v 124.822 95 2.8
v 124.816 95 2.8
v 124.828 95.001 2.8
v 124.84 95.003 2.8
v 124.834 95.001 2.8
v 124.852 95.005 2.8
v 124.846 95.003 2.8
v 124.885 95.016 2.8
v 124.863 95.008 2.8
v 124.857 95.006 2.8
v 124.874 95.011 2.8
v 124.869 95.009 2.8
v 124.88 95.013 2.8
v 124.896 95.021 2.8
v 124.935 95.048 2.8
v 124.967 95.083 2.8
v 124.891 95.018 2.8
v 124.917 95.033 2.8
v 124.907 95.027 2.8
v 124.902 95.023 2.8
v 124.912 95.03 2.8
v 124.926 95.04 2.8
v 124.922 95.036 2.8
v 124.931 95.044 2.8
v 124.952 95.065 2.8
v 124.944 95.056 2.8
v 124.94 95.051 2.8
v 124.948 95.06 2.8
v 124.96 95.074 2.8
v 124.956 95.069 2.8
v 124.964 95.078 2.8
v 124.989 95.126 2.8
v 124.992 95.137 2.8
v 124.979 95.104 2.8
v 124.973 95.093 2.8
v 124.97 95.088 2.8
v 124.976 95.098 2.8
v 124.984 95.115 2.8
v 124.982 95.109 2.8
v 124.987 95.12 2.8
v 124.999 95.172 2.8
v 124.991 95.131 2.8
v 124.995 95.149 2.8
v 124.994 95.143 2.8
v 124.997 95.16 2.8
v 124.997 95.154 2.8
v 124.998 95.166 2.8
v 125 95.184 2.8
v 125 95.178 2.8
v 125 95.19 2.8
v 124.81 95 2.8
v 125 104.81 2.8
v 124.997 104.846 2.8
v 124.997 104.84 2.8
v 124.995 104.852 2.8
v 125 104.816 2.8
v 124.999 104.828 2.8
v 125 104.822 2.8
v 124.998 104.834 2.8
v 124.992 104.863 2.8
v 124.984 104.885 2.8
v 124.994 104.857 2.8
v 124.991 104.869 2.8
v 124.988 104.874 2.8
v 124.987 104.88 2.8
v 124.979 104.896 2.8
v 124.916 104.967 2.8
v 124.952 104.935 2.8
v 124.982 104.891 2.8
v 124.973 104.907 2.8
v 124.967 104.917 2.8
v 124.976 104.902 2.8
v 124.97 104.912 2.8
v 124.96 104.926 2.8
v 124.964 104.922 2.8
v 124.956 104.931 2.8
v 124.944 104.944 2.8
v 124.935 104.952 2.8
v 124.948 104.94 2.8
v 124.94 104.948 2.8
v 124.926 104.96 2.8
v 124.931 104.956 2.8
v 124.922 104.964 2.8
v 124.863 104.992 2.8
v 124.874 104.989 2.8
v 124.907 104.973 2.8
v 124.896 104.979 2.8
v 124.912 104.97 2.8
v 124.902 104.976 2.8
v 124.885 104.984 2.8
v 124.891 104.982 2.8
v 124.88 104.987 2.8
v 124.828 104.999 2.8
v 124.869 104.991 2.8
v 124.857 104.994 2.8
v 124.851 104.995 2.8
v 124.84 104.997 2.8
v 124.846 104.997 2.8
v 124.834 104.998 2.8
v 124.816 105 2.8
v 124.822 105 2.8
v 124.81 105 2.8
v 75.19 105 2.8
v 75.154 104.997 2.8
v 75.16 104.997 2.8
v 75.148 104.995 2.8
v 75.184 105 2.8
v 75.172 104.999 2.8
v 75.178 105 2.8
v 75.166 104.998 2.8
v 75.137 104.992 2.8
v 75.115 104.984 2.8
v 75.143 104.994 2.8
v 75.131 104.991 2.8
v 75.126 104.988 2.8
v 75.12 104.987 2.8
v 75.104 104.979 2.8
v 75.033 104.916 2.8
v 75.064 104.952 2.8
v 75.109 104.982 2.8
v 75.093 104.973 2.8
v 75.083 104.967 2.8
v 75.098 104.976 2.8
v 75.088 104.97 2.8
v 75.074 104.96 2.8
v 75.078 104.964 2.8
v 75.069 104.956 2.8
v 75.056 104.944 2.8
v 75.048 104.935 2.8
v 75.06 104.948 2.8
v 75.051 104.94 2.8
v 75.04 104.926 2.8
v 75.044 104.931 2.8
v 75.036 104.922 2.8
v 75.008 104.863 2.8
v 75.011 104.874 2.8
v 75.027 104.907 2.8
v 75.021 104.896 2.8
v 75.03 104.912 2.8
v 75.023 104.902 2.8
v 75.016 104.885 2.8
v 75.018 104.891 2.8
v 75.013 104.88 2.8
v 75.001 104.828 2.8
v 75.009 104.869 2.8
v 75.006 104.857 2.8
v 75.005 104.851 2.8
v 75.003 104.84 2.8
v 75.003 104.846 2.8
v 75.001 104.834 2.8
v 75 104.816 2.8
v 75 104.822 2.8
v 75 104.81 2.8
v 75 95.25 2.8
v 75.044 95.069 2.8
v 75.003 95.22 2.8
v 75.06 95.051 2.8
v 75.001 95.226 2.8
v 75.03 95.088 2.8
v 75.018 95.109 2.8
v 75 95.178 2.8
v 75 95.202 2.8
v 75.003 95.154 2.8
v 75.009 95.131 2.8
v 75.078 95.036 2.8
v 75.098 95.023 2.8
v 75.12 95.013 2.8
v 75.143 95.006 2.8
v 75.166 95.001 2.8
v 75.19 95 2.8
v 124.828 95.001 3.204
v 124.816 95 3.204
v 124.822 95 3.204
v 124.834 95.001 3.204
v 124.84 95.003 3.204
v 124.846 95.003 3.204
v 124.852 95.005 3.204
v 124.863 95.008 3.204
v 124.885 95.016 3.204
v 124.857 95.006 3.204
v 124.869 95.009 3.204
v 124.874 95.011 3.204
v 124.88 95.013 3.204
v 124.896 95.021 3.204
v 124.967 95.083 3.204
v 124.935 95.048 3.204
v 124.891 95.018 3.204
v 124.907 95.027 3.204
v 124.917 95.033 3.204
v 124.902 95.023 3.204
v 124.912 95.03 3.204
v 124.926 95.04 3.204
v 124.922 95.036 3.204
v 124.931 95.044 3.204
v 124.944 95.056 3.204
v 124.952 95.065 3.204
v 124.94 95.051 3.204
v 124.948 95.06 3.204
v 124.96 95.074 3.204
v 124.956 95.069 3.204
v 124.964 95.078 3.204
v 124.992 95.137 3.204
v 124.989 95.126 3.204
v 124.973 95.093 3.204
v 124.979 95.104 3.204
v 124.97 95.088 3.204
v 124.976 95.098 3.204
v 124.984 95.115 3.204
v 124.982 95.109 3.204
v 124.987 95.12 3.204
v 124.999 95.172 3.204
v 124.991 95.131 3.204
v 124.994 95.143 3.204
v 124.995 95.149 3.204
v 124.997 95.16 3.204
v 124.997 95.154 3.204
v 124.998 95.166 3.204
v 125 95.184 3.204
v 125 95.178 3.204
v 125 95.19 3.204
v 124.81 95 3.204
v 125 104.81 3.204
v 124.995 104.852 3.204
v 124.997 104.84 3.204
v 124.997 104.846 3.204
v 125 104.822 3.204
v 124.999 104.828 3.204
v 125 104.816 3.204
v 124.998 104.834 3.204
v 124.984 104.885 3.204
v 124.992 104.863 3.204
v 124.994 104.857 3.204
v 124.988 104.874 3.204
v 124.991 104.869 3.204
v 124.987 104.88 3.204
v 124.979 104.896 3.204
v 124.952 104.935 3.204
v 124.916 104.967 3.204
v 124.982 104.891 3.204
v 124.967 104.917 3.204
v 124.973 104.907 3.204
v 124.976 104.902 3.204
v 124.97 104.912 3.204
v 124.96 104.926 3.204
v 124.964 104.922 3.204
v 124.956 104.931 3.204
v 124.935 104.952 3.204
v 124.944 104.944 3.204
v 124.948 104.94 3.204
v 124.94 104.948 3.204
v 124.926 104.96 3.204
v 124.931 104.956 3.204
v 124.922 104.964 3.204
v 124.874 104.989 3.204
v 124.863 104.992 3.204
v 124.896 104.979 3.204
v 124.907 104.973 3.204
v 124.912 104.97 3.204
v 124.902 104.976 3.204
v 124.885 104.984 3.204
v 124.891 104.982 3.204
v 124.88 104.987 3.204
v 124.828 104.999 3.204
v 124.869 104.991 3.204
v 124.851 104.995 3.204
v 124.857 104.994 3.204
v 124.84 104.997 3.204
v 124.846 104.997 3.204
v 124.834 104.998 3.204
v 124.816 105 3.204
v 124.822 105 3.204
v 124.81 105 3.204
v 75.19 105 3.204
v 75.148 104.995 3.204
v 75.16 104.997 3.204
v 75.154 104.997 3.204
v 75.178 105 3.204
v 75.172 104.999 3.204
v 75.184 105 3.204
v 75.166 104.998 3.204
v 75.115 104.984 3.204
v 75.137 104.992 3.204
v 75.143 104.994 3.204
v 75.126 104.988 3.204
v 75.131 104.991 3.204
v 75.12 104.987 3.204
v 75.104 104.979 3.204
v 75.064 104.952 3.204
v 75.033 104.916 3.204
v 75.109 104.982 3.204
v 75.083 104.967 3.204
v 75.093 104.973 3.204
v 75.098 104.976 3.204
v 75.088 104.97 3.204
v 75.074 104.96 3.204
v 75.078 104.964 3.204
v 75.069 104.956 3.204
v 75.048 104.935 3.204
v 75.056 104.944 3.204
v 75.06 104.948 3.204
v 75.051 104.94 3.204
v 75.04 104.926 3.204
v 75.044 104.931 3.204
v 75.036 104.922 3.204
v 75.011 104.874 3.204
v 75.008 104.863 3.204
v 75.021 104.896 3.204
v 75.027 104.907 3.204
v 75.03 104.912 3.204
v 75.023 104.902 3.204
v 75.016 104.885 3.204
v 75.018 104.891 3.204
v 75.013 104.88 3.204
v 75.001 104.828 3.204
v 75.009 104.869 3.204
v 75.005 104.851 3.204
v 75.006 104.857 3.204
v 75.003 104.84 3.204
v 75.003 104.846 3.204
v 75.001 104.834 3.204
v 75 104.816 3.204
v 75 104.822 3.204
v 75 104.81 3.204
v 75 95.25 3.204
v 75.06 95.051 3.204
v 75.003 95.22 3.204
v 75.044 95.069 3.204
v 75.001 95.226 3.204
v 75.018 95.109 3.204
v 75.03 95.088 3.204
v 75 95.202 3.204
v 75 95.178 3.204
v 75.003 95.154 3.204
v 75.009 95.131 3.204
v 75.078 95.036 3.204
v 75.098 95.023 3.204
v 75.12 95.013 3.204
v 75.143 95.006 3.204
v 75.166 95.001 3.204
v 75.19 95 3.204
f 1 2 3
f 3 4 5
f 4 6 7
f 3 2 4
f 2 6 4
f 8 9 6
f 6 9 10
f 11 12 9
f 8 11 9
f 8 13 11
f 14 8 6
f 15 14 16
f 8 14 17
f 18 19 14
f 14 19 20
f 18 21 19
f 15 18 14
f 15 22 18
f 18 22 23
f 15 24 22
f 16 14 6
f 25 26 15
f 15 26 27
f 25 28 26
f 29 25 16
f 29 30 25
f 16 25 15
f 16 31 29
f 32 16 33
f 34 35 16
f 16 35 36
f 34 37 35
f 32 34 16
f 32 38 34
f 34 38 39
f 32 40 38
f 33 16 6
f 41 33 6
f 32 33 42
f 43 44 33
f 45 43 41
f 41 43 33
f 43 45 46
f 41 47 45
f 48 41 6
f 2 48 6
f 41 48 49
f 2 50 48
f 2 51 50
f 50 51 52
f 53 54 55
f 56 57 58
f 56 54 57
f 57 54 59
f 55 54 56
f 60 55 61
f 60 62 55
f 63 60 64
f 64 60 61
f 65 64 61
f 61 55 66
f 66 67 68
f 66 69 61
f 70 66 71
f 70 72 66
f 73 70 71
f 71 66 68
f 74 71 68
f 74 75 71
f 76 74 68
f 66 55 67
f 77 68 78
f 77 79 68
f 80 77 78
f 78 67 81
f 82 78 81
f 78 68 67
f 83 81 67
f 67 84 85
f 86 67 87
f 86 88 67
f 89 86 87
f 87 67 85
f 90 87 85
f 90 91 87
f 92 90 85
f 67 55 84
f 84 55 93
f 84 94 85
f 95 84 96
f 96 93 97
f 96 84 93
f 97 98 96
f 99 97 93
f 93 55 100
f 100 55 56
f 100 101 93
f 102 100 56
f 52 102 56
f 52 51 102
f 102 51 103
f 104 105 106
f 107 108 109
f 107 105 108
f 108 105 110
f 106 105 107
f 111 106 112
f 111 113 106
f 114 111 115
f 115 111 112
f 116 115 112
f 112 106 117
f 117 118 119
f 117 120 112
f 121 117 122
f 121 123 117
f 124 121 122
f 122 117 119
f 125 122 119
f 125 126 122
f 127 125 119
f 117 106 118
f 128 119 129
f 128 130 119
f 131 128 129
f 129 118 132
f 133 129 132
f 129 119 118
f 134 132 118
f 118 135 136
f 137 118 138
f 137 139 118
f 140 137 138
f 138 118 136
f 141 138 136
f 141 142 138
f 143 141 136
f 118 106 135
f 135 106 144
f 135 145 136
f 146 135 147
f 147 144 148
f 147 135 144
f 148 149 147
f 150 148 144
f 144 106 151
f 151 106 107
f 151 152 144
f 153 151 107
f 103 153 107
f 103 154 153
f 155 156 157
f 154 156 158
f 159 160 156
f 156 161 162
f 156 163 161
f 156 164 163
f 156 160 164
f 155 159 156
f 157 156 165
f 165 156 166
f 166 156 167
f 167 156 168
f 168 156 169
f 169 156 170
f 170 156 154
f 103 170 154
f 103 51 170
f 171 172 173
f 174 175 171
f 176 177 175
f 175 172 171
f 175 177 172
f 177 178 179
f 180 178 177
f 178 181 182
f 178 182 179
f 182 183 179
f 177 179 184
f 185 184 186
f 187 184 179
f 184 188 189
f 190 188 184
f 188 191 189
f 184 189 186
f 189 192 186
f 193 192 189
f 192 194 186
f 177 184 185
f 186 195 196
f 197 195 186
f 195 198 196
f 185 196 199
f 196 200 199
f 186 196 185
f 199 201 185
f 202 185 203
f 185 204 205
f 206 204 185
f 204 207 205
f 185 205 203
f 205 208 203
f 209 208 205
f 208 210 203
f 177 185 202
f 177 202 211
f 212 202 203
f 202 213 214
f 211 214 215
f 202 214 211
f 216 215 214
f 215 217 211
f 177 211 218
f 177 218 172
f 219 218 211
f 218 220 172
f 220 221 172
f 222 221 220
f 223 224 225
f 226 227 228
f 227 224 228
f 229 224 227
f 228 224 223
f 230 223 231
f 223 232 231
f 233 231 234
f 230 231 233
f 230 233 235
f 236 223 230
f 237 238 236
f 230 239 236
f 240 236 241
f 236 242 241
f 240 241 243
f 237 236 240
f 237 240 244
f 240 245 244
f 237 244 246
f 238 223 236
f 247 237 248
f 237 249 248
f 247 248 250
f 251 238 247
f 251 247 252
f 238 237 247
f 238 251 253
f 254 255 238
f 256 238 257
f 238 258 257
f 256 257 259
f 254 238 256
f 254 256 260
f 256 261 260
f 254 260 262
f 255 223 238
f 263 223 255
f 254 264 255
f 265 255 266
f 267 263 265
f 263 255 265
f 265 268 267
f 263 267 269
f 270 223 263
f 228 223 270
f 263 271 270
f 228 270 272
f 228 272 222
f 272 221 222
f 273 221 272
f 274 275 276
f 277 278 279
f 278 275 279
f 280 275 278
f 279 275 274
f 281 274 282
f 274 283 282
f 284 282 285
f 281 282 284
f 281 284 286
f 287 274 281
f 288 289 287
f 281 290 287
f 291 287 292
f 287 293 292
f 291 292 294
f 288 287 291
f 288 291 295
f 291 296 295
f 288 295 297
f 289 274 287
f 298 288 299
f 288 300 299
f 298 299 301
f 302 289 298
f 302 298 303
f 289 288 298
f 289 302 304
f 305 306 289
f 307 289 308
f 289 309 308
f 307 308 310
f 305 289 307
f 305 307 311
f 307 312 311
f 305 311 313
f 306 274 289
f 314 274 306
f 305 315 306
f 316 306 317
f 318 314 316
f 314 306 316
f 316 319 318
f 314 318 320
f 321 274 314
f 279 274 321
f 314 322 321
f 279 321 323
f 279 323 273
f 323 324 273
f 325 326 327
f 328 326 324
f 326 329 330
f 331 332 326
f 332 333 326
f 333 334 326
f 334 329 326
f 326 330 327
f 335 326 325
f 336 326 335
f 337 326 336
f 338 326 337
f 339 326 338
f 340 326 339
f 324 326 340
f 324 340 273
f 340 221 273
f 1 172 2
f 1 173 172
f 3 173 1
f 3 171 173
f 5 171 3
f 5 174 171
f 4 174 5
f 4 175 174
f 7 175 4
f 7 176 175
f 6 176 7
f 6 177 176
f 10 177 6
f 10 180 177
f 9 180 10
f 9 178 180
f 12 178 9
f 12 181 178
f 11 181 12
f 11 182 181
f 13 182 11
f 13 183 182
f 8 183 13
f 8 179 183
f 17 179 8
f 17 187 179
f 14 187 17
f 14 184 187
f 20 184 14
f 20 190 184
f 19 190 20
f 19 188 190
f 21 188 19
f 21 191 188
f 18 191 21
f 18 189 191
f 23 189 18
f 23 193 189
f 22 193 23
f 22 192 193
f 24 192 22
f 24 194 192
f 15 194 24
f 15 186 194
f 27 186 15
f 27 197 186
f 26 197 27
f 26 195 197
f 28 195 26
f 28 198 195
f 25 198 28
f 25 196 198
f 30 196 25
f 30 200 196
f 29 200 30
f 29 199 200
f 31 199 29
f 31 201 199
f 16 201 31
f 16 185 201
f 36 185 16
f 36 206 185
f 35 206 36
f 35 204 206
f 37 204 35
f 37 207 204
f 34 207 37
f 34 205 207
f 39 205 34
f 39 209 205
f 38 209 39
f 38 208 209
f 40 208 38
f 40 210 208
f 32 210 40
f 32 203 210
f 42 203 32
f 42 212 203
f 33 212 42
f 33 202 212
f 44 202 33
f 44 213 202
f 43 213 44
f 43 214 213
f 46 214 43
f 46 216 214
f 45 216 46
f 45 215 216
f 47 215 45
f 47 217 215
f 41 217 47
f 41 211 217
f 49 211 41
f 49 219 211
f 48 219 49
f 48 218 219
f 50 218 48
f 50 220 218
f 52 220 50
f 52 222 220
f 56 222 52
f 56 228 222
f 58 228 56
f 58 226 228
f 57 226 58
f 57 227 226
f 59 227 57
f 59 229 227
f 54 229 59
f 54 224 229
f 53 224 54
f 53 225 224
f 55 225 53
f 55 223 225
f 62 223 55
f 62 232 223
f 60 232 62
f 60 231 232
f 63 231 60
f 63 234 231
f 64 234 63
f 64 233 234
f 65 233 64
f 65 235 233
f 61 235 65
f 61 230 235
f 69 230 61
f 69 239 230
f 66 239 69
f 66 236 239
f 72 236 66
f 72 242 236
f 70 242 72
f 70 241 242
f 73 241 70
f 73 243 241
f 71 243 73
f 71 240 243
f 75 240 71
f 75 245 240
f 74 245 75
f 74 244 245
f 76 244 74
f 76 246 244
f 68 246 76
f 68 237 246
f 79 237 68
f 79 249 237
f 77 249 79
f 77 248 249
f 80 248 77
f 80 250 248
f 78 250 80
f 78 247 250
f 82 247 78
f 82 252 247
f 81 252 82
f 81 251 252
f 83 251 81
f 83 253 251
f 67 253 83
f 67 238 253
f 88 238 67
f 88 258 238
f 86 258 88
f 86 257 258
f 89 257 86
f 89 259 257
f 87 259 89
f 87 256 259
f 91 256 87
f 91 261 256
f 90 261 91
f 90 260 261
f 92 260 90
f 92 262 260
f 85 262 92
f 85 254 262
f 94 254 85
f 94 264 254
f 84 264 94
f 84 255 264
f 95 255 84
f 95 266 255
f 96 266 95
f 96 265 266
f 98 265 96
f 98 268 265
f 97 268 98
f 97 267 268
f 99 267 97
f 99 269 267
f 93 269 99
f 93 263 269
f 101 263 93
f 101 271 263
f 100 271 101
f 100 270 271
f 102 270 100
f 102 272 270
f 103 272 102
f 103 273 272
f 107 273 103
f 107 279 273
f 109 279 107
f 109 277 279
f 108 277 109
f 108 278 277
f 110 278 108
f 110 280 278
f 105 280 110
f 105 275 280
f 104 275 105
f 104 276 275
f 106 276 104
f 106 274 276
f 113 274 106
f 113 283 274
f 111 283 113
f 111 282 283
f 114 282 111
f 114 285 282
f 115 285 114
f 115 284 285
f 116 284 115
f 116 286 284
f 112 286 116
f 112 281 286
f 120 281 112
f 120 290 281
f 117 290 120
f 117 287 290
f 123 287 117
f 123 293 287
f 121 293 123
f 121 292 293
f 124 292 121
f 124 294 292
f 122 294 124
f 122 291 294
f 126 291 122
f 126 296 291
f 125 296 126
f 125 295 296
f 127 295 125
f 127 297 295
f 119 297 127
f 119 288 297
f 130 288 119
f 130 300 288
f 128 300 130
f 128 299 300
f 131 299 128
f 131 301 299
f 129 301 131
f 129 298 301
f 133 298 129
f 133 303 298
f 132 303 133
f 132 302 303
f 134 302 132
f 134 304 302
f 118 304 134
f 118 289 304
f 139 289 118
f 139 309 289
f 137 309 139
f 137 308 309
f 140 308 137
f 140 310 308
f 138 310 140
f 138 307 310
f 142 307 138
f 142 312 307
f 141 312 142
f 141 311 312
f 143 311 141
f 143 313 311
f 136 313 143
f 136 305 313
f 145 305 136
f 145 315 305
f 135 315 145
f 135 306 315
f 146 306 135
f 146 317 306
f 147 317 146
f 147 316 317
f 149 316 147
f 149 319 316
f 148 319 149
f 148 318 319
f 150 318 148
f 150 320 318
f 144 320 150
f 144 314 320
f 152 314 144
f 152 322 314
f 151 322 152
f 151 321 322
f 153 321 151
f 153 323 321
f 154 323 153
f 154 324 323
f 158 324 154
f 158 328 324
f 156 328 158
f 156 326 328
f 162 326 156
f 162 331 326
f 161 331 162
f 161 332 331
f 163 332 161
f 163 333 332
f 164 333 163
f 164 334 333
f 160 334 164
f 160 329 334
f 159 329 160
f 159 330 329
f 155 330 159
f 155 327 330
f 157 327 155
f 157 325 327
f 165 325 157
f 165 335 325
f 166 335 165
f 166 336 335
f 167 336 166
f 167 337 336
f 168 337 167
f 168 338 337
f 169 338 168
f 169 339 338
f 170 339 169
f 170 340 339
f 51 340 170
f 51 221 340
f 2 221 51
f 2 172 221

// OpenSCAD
module drawBasicShape(x1, y1, x2, y2, width)
{
	length = sqrt((x1-x2)*(x1-x2) + (y1-y2)*(y1-y2));
	if (width!=0.0) {
		square(size = [width, length], center = false);
		translate([width/2.0, 0, 0]) circle(d=width);
		translate([width/2.0, length, 0]) circle(d=width);
	}
}

module translateAndRotate(x1, y1, x2, y2, width)
{
	if (width != 0.0) {
		angle = atan((y2-y1)/(x2-x1)) +270;
		if (x2>=x1) {
			translate([x1, y1, 0.0]) rotate([0.0, 0.0, angle]) translate([-width/2.0, 0.0, 0.0]) scale([1.0, 1.0, 1.0]) drawBasicShape(x1, y1, x2, y2, width);
		}
		else {
			translate([x1, y1, 0.0]) rotate([0.0, 0.0, angle+180]) translate([-width/2.0, 0.0, 0.0]) scale([1.0, 1.0, 1.0]) drawBasicShape(x1, y1, x2, y2, width);		}
	}
}

$fn=50;

points6 = [
[75.77800000, 95.77800000, 0.00000000],
[124.22200000, 95.77800000, 0.37999548],
[124.22200000, 104.22200000, 0.37997788],
[75.77800000, 104.22200000, 0.37999672],
[75.77800000, 95.83800000, 0.37997423],
[75.48400000, 95.48400000, 0.00000000],
[124.51600000, 95.48400000, 0.37999868],
[124.51600000, 104.51600000, 0.37998977],
[75.48400000, 104.51600000, 0.37999746],
[75.48400000, 95.54400000, 0.37999314],
[75.19000000, 95.19000000, 0.00000000],
[124.81000000, 95.19000000, 0.37999939],
[124.81000000, 104.81000000, 0.38000021],
[75.19000000, 104.81000000, 0.38000060],
[75.19000000, 95.25000000, 0.37999715],
[75.53600000, 95.39000000, 0.00000000],
[75.94600000, 103.88900000, 0.00000000],
[76.11100000, 104.05400000, 0.37961375],
[76.52800000, 104.05400000, 0.38001190],
[75.94600000, 103.47200000, 0.37989934],
[75.94600000, 103.05500000, 0.38015610],
[76.94500000, 104.05400000, 0.37994651],
[77.36200000, 104.05400000, 0.38001190],
[75.94600000, 102.63800000, 0.37999592],
[75.94600000, 102.22100000, 0.38001190],
[77.77900000, 104.05400000, 0.37999966],
[78.19600000, 104.05400000, 0.38015610],
[75.94600000, 101.80400000, 0.38000201],
[75.94600000, 101.38700000, 0.38001190],
[78.61300000, 104.05400000, 0.38001957],
[79.03000000, 104.05400000, 0.38001190],
[75.94600000, 100.97000000, 0.38001859],
[75.94600000, 100.55300000, 0.38015610],
[79.44700000, 104.05400000, 0.38001785],
[79.86400000, 104.05400000, 0.38001190],
[75.94600000, 100.13600000, 0.38002811],
[75.94600000, 99.71900000, 0.38001190],
[80.28100000, 104.05400000, 0.38002660],
[80.69800000, 104.05400000, 0.38001190],
[75.94600000, 99.30200000, 0.38003429],
[75.94600000, 98.88500000, 0.38001190],
[81.11500000, 104.05400000, 0.38003252],
[81.53300000, 104.05400000, 0.37930814],
[75.94600000, 98.46700000, 0.37997836],
[75.94600000, 98.05000000, 0.38001190],
[81.95000000, 104.05400000, 0.37998780],
[82.36700000, 104.05400000, 0.38001190],
[75.94600000, 97.63300000, 0.37998277],
[75.94600000, 97.21600000, 0.38015610],
[82.78400000, 104.05400000, 0.37999079],
[83.20100000, 104.05400000, 0.38001190],
[75.94600000, 96.79900000, 0.37999203],
[75.94600000, 96.38200000, 0.38015610],
[83.61800000, 104.05400000, 0.37999314],
[84.03500000, 104.05400000, 0.38001190],
[75.95600000, 95.97600000, 0.38000275],
[76.34400000, 95.94600000, 0.37958004],
[84.45200000, 104.05400000, 0.38000754],
[84.86900000, 104.05400000, 0.38001190],
[76.76100000, 95.94600000, 0.38000229],
[77.17800000, 95.94600000, 0.38015610],
[85.28600000, 104.05400000, 0.38000229],
[85.70300000, 104.05400000, 0.38001190],
[77.59500000, 95.94600000, 0.38000229],
[78.01200000, 95.94600000, 0.38015610],
[86.12000000, 104.05400000, 0.38000229],
[86.53700000, 104.05400000, 0.38001190],
[78.42900000, 95.94600000, 0.38000754],
[78.84600000, 95.94600000, 0.38001190],
[86.95400000, 104.05400000, 0.38000229],
[87.37100000, 104.05400000, 0.38015610],
[79.26300000, 95.94600000, 0.38000229],
[79.68000000, 95.94600000, 0.38001190],
[87.78900000, 104.05400000, 0.37998415],
[88.20600000, 104.05400000, 0.38015610],
[80.09700000, 95.94600000, 0.37998415],
[80.51500000, 95.94600000, 0.37930814],
[88.62300000, 104.05400000, 0.38000754],
[89.04000000, 104.05400000, 0.38001190],
[80.93200000, 95.94600000, 0.38000229],
[81.34900000, 95.94600000, 0.38015610],
[89.45700000, 104.05400000, 0.38000229],
[89.87400000, 104.05400000, 0.38001190],
[81.76600000, 95.94600000, 0.38000229],
[82.18300000, 95.94600000, 0.38015610],
[90.29100000, 104.05400000, 0.38000229],
[90.70800000, 104.05400000, 0.38001190],
[82.60000000, 95.94600000, 0.38000754],
[83.01700000, 95.94600000, 0.38001190],
[91.12500000, 104.05400000, 0.38000229],
[91.54200000, 104.05400000, 0.38001190],
[83.43400000, 95.94600000, 0.38000754],
[83.85100000, 95.94600000, 0.38001190],
[91.95900000, 104.05400000, 0.38000229],
[92.37600000, 104.05400000, 0.38015610],
[84.26800000, 95.94600000, 0.38000229],
[84.68500000, 95.94600000, 0.38001190],
[92.79300000, 104.05400000, 0.38000754],
[93.21000000, 104.05400000, 0.38001190],
[85.10200000, 95.94600000, 0.38000229],
[85.51900000, 95.94600000, 0.38001190],
[93.62700000, 104.05400000, 0.38000754],
[94.04400000, 104.05400000, 0.38001190],
[85.93600000, 95.94600000, 0.38000229],
[86.35300000, 95.94600000, 0.38015610],
[94.46200000, 104.05400000, 0.37998415],
[94.87900000, 104.05400000, 0.38001190],
[86.77000000, 95.94600000, 0.37998940],
[87.18800000, 95.94600000, 0.37930814],
[95.29600000, 104.05400000, 0.38000229],
[95.71300000, 104.05400000, 0.38001190],
[87.60500000, 95.94600000, 0.38000754],
[88.02200000, 95.94600000, 0.38001190],
[96.13000000, 104.05400000, 0.38000229],
[96.54700000, 104.05400000, 0.38015610],
[88.43900000, 95.94600000, 0.38000229],
[88.85600000, 95.94600000, 0.38001190],
[96.96400000, 104.05400000, 0.38000754],
[97.38100000, 104.05400000, 0.38001190],
[89.27300000, 95.94600000, 0.38000229],
[89.69000000, 95.94600000, 0.38001190],
[97.79800000, 104.05400000, 0.38000754],
[98.21500000, 104.05400000, 0.38001190],
[90.10700000, 95.94600000, 0.38000229],
[90.52400000, 95.94600000, 0.38015610],
[98.63200000, 104.05400000, 0.38000229],
[99.04900000, 104.05400000, 0.38001190],
[90.94100000, 95.94600000, 0.38000754],
[91.35800000, 95.94600000, 0.38001190],
[99.46600000, 104.05400000, 0.38000229],
[99.88300000, 104.05400000, 0.38001190],
[91.77500000, 95.94600000, 0.38000754],
[92.19200000, 95.94600000, 0.38001190],
[100.30000000, 104.05400000, 0.38000229],
[100.71800000, 104.05400000, 0.37945200],
[92.60900000, 95.94600000, 0.37998415],
[93.02600000, 95.94600000, 0.38001190],
[101.13500000, 104.05400000, 0.37998940],
[101.55200000, 104.05400000, 0.38001190],
[93.44400000, 95.94600000, 0.38000229],
[93.86100000, 95.94600000, 0.38001190],
[101.96900000, 104.05400000, 0.38000754],
[102.38600000, 104.05400000, 0.38001190],
[94.27800000, 95.94600000, 0.38000229],
[94.69500000, 95.94600000, 0.38015610],
[102.80300000, 104.05400000, 0.38000229],
[103.22000000, 104.05400000, 0.38001190],
[95.11200000, 95.94600000, 0.38000229],
[95.52900000, 95.94600000, 0.38015610],
[103.63700000, 104.05400000, 0.38000229],
[104.05400000, 104.05400000, 0.38001190],
[95.94600000, 95.94600000, 0.38000754],
[96.36300000, 95.94600000, 0.38001190],
[104.47100000, 104.05400000, 0.38000229],
[104.88800000, 104.05400000, 0.38001190],
[96.78000000, 95.94600000, 0.38000754],
[97.19700000, 95.94600000, 0.38001190],
[105.30500000, 104.05400000, 0.38000229],
[105.72200000, 104.05400000, 0.38015610],
[97.61400000, 95.94600000, 0.38000229],
[98.03100000, 95.94600000, 0.38001190],
[106.13900000, 104.05400000, 0.38000754],
[106.55600000, 104.05400000, 0.38001190],
[98.44800000, 95.94600000, 0.38000229],
[98.86500000, 95.94600000, 0.38001190],
[106.97300000, 104.05400000, 0.38000754],
[107.39100000, 104.05400000, 0.37930814],
[99.28200000, 95.94600000, 0.37998415],
[99.69900000, 95.94600000, 0.38015610],
[107.80800000, 104.05400000, 0.37998415],
[108.22500000, 104.05400000, 0.38001190],
[100.11700000, 95.94600000, 0.38000754],
[100.53400000, 95.94600000, 0.38001190],
[108.64200000, 104.05400000, 0.38000229],
[109.05900000, 104.05400000, 0.38001190],
[100.95100000, 95.94600000, 0.38000754],
[101.36800000, 95.94600000, 0.38001190],
[109.47600000, 104.05400000, 0.38000229],
[109.89300000, 104.05400000, 0.38015610],
[101.78500000, 95.94600000, 0.38000229],
[102.20200000, 95.94600000, 0.38001190],
[110.31000000, 104.05400000, 0.38000754],
[110.72700000, 104.05400000, 0.38001190],
[102.61900000, 95.94600000, 0.38000229],
[103.03600000, 95.94600000, 0.38001190],
[111.14400000, 104.05400000, 0.38000754],
[111.56100000, 104.05400000, 0.38001190],
[103.45300000, 95.94600000, 0.38000229],
[103.87000000, 95.94600000, 0.38015610],
[111.97800000, 104.05400000, 0.38000229],
[112.39500000, 104.05400000, 0.38001190],
[104.28700000, 95.94600000, 0.38000754],
[104.70400000, 95.94600000, 0.38001190],
[112.81200000, 104.05400000, 0.38000229],
[113.22900000, 104.05400000, 0.38001190],
[105.12100000, 95.94600000, 0.38000754],
[105.53800000, 95.94600000, 0.38001190],
[113.64700000, 104.05400000, 0.37998415],
[114.06400000, 104.05400000, 0.38015610],
[105.95500000, 95.94600000, 0.37998415],
[106.37300000, 95.94600000, 0.37930814],
[114.48100000, 104.05400000, 0.38000754],
[114.89800000, 104.05400000, 0.38001190],
[106.79000000, 95.94600000, 0.38000229],
[107.20700000, 95.94600000, 0.38001190],
[115.31500000, 104.05400000, 0.38000754],
[115.73200000, 104.05400000, 0.38001190],
[107.62400000, 95.94600000, 0.38000229],
[108.04100000, 95.94600000, 0.38015610],
[116.14900000, 104.05400000, 0.38000229],
[116.56600000, 104.05400000, 0.38001190],
[108.45800000, 95.94600000, 0.38000229],
[108.87500000, 95.94600000, 0.38015610],
[116.98300000, 104.05400000, 0.38000229],
[117.40000000, 104.05400000, 0.38001190],
[109.29200000, 95.94600000, 0.38000754],
[109.70900000, 95.94600000, 0.38001190],
[117.81700000, 104.05400000, 0.38000229],
[118.23400000, 104.05400000, 0.38015610],
[110.12600000, 95.94600000, 0.38000229],
[110.54300000, 95.94600000, 0.38001190],
[118.65100000, 104.05400000, 0.38000229],
[119.06800000, 104.05400000, 0.38015610],
[110.96000000, 95.94600000, 0.38000229],
[111.37700000, 95.94600000, 0.38001190],
[119.48500000, 104.05400000, 0.38000754],
[119.90200000, 104.05400000, 0.38001190],
[111.79400000, 95.94600000, 0.38000229],
[112.21100000, 95.94600000, 0.38001190],
[120.32000000, 104.05400000, 0.37998940],
[120.73700000, 104.05400000, 0.38001190],
[112.62900000, 95.94600000, 0.38000229],
[113.04600000, 95.94600000, 0.38015610],
[121.15400000, 104.05400000, 0.38000229],
[121.57100000, 104.05400000, 0.38001190],
[113.46300000, 95.94600000, 0.38000754],
[113.88000000, 95.94600000, 0.38001190],
[121.98800000, 104.05400000, 0.38000229],
[122.40500000, 104.05400000, 0.38001190],
[114.29700000, 95.94600000, 0.38000754],
[114.71400000, 95.94600000, 0.38001190],
[122.82200000, 104.05400000, 0.38000229],
[123.23900000, 104.05400000, 0.38015610],
[115.13100000, 95.94600000, 0.38000229],
[115.54800000, 95.94600000, 0.38001190],
[123.65600000, 104.05400000, 0.38000754],
[124.04400000, 104.02500000, 0.37963728],
[115.96500000, 95.94600000, 0.37998455],
[116.38200000, 95.94600000, 0.38001190],
[124.05400000, 103.61800000, 0.37999868],
[124.05400000, 103.20100000, 0.38001190],
[116.79900000, 95.94600000, 0.37999789],
[117.21600000, 95.94600000, 0.38001190],
[124.05400000, 102.78400000, 0.37999079],
[124.05400000, 102.36700000, 0.38015610],
[117.63300000, 95.94600000, 0.37998939],
[118.05000000, 95.94600000, 0.38001190],
[124.05400000, 101.95000000, 0.37998780],
[124.05400000, 101.53300000, 0.38001190],
[118.46700000, 95.94600000, 0.37997836],
[118.88400000, 95.94600000, 0.38015610],
[124.05400000, 101.11600000, 0.37997562],
[124.05400000, 100.69800000, 0.37930814],
[119.30200000, 95.94600000, 0.38003429],
[119.71900000, 95.94600000, 0.38001190],
[124.05400000, 100.28100000, 0.38002660],
[124.05400000, 99.86400000, 0.38001190],
[120.13600000, 95.94600000, 0.38003896],
[120.55300000, 95.94600000, 0.38001190],
[124.05400000, 99.44700000, 0.38001785],
[124.05400000, 99.03000000, 0.38015610],
[120.97000000, 95.94600000, 0.38001859],
[121.38700000, 95.94600000, 0.38001190],
[124.05400000, 98.61300000, 0.38001957],
[124.05400000, 98.19600000, 0.38015610],
[121.80400000, 95.94600000, 0.38000201],
[122.22100000, 95.94600000, 0.38015610],
[124.05400000, 97.77900000, 0.37999966],
[124.05400000, 97.36200000, 0.38001190],
[122.63800000, 95.94600000, 0.37999592],
[123.05500000, 95.94600000, 0.38015610],
[124.05400000, 96.94500000, 0.37994651],
[124.05400000, 96.52800000, 0.38015610],
[123.47200000, 95.94600000, 0.37989934],
[123.88900000, 95.94600000, 0.38001190],
[124.05400000, 96.11100000, 0.37987144],
];

translate([0.0, 0.0, 2.80000000]) {
	linear_extrude(height = 0.40400000, center = false, convexity = 10, twist = 0) {
		union() {
			for( i=[0:len(points6)-2] ){ 
				x1 = points6[i][0];
				y1 = points6[i][1];
				x2 = points6[i+1][0];
				y2 = points6[i+1][1];
				width = points6[i+1][2];
				translateAndRotate(x1, y1, x2, y2, width);
			}
		}
	}
}
